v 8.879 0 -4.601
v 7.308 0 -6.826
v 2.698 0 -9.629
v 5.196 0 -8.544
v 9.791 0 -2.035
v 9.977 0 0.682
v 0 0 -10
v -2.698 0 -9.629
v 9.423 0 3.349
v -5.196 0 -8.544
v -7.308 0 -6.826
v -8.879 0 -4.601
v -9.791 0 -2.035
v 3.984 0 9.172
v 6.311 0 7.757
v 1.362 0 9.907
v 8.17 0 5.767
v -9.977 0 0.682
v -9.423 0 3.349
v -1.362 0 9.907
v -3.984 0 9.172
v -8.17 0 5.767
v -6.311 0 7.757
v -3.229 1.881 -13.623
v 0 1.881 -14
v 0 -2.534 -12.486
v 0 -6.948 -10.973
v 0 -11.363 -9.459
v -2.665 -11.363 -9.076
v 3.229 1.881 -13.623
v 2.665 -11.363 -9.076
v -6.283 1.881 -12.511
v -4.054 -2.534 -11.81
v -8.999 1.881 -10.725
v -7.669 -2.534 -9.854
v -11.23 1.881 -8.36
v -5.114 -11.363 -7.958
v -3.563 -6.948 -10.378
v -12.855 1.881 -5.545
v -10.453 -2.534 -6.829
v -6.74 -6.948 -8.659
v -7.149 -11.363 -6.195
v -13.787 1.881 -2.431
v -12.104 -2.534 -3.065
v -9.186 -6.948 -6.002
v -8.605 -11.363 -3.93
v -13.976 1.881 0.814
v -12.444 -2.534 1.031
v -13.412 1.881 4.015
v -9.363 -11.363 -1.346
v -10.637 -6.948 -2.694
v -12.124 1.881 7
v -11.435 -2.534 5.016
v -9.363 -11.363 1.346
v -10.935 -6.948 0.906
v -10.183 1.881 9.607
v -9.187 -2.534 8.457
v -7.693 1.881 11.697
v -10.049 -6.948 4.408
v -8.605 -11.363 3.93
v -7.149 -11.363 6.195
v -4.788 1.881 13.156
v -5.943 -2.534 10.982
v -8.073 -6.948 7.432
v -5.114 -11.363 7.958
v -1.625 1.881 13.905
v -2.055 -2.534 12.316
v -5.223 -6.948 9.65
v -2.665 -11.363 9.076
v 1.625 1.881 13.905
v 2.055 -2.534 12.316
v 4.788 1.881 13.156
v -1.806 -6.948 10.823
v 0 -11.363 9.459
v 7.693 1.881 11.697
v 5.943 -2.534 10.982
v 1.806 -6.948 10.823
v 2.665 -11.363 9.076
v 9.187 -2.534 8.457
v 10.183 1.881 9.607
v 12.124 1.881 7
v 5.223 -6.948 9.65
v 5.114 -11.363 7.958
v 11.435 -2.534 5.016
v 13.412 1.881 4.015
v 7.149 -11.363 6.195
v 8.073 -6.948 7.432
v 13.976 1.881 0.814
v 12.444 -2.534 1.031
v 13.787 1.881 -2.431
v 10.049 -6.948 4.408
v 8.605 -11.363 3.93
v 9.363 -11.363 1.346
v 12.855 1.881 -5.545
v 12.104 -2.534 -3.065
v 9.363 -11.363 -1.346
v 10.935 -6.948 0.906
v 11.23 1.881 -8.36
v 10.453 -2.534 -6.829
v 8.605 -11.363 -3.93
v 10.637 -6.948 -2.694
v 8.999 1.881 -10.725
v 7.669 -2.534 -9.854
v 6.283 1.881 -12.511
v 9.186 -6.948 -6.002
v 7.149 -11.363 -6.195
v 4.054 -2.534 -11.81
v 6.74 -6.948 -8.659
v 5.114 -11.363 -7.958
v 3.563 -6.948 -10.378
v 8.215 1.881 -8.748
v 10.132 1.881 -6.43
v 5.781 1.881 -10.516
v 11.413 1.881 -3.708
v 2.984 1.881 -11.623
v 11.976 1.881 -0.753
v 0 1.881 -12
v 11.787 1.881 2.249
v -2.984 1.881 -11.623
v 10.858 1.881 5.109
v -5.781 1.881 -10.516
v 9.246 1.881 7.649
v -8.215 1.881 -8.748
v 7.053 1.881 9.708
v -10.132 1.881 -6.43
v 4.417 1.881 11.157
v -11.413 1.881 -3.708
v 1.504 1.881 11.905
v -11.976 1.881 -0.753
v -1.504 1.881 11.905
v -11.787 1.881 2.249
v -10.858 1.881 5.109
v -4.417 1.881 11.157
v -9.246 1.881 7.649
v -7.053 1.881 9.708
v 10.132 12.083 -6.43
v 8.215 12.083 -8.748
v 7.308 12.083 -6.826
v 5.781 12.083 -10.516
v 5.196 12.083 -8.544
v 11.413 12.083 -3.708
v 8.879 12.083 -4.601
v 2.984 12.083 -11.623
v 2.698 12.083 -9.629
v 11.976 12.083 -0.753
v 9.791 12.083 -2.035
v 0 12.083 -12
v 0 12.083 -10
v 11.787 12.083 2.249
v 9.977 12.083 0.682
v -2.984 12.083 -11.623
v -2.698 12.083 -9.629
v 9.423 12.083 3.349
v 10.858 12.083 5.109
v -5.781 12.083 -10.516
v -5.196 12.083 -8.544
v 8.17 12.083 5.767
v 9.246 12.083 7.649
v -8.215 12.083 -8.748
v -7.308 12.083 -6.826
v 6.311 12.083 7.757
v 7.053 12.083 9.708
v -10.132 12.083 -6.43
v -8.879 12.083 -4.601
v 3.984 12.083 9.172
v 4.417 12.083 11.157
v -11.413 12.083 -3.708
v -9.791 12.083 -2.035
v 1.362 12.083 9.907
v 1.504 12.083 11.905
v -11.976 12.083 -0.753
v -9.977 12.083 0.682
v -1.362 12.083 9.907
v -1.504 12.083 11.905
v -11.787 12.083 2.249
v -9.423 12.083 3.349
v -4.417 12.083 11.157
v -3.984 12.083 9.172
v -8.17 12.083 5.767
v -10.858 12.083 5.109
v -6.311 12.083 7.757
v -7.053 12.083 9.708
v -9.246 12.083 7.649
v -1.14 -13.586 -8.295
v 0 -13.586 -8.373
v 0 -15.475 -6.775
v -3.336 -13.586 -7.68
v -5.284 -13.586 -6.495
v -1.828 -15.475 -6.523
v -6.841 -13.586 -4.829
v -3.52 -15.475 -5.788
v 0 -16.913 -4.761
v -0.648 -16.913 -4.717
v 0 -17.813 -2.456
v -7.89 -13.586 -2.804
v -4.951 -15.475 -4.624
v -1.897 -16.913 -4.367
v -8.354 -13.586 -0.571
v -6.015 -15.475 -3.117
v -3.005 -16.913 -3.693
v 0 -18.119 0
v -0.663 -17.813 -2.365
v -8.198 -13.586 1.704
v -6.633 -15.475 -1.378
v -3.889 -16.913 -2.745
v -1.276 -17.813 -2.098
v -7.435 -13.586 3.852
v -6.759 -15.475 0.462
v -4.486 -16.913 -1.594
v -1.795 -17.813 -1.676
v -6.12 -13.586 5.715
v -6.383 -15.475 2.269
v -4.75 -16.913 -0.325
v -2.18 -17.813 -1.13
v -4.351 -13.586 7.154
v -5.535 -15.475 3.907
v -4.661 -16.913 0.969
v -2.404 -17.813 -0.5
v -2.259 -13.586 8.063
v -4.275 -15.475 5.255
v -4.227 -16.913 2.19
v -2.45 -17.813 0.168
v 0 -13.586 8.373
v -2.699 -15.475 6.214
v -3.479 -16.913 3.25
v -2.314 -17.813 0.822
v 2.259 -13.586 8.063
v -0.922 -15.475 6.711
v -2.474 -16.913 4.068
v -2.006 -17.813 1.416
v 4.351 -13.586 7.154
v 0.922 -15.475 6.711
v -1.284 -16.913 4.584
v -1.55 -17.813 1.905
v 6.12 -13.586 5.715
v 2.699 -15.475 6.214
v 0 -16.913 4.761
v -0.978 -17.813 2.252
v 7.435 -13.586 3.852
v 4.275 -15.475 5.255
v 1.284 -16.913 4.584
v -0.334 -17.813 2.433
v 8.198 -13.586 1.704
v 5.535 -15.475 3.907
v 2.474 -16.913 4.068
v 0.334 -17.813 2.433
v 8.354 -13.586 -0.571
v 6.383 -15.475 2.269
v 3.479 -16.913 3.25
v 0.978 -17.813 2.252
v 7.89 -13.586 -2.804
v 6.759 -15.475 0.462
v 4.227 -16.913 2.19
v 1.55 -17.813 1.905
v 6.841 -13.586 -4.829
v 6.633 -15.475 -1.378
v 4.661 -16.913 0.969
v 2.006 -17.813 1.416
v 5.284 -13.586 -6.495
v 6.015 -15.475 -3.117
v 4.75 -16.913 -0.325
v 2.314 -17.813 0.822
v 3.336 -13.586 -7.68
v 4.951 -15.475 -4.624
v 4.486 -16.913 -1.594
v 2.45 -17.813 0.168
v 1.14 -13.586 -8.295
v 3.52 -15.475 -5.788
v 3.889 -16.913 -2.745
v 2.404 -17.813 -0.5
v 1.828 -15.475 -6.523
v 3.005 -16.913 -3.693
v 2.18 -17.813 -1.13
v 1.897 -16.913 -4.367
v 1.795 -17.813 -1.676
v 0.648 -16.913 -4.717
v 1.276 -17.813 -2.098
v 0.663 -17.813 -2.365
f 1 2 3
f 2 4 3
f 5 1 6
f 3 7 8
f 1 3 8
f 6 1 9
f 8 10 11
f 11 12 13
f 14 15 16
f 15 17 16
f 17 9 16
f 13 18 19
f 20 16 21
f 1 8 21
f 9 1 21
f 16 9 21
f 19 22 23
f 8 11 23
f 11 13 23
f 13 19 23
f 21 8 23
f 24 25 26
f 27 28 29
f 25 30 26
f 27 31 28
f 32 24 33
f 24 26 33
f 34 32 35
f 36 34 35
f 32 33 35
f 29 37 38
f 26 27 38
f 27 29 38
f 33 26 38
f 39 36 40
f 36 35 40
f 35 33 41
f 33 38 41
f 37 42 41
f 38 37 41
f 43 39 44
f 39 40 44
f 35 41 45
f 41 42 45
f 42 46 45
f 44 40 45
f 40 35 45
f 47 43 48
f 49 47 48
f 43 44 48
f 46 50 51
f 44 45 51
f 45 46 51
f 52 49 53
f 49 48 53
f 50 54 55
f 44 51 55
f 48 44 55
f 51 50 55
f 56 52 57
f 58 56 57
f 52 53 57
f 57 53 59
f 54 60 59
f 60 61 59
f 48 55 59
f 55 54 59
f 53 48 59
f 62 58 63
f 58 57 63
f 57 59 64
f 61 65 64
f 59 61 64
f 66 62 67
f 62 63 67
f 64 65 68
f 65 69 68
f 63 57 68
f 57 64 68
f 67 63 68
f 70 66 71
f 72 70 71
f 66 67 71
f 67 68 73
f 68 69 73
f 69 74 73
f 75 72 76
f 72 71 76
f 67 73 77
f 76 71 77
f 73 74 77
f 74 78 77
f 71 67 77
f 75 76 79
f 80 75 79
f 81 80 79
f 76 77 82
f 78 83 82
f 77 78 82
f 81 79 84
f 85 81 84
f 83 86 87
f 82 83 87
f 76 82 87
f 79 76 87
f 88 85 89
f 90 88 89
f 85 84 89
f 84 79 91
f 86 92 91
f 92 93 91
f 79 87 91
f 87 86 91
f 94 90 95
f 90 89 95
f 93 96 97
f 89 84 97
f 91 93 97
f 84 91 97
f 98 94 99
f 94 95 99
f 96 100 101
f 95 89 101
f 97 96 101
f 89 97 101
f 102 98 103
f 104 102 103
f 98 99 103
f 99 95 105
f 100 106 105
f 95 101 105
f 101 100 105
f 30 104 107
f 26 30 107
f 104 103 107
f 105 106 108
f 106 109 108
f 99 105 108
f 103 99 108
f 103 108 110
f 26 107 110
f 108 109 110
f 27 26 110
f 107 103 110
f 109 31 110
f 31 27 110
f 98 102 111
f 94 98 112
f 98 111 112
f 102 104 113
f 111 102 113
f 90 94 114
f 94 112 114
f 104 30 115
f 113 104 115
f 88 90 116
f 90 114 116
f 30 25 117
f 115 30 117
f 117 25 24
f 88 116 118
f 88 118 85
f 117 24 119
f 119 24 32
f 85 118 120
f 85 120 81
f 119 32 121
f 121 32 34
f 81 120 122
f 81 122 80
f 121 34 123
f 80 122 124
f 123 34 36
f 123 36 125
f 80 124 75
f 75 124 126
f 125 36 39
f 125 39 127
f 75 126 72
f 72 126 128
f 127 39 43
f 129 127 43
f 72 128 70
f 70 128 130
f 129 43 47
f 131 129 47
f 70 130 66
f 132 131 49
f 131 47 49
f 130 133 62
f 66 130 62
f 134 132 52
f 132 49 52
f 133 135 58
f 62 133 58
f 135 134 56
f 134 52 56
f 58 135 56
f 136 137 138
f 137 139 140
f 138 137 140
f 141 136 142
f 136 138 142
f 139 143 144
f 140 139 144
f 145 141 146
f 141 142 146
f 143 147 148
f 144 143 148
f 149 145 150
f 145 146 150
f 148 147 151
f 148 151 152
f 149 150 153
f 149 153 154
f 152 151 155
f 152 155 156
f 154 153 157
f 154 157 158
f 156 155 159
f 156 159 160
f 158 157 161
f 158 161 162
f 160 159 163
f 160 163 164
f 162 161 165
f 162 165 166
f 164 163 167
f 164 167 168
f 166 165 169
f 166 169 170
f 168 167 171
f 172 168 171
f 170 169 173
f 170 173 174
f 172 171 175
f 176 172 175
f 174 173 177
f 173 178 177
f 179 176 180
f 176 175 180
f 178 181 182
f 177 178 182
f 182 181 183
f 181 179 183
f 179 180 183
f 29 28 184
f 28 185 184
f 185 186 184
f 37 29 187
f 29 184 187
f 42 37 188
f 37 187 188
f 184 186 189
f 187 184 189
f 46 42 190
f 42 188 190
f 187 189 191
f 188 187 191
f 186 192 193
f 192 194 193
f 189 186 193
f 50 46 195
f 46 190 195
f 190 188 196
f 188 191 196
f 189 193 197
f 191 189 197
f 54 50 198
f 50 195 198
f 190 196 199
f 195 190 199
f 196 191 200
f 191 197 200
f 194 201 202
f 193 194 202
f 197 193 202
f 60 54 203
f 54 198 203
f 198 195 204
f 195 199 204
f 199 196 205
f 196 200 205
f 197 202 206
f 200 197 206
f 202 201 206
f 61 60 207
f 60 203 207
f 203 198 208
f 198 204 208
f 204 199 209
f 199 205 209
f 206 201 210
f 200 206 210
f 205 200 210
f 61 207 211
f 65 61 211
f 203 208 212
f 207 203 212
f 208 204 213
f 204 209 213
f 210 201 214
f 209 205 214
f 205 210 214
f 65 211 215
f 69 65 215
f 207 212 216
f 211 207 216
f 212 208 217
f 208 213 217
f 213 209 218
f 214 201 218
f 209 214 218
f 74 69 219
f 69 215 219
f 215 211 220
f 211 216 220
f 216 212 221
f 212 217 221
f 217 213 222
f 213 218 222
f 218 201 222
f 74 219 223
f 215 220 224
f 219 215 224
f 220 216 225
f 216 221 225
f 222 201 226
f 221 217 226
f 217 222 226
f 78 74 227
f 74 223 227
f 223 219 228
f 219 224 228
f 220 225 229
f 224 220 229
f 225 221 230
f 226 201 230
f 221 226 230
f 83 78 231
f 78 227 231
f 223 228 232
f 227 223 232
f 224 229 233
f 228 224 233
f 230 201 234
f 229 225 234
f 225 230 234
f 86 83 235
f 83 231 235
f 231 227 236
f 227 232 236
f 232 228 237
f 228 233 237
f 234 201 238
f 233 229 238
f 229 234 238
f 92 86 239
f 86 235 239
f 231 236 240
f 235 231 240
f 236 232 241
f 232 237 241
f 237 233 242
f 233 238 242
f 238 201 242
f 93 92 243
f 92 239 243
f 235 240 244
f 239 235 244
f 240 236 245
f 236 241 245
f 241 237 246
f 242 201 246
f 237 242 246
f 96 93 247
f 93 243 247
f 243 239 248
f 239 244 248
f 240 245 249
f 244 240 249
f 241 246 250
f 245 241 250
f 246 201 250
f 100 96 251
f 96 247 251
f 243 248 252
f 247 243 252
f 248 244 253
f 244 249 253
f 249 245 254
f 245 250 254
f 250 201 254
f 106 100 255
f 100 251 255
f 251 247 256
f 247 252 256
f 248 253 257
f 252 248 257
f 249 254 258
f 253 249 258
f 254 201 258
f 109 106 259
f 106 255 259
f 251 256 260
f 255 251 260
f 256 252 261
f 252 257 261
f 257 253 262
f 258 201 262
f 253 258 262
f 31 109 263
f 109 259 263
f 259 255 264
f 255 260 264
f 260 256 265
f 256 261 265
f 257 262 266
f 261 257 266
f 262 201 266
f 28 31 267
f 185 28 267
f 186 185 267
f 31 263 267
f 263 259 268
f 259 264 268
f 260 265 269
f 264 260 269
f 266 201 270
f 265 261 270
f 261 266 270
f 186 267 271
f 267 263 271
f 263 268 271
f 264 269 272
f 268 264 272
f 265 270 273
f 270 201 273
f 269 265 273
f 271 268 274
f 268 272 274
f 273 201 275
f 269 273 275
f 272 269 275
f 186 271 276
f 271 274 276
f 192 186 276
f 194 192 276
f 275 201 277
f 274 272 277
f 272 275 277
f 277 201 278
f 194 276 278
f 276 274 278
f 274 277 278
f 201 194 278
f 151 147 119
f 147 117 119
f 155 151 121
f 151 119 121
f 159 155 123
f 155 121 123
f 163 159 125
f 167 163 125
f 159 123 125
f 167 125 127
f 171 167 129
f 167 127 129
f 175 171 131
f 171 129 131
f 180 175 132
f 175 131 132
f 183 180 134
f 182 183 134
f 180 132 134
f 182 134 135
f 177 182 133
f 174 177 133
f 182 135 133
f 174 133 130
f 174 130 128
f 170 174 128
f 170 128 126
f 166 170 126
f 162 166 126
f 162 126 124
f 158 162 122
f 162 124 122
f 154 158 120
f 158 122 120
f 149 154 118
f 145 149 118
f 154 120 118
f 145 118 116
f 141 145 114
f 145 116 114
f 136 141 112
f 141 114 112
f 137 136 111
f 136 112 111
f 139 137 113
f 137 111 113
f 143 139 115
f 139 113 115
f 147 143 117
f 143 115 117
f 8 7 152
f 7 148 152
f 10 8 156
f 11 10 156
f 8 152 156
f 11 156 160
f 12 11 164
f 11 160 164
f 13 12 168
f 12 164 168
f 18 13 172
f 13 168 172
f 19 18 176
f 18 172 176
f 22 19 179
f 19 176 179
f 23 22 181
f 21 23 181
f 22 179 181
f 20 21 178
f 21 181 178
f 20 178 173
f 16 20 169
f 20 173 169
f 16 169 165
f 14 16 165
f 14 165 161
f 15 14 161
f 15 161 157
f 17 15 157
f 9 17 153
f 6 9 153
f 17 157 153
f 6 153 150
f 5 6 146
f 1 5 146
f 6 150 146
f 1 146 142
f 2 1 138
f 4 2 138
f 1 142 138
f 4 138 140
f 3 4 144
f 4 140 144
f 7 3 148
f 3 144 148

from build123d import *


with BuildPart() as part:
    # Esquisse1 → Révolution1 (revolve)
    with BuildSketch(Plane.XY, mode=Mode.PRIVATE) as r_volution1_sk:
        with BuildLine():
            Line((-10, 0), (-10, 12.083333333))
            Line((-10, 12.083333333), (-12, 12.083333333))
            Line((-12, 12.083333333), (-12, 1.880668734))
            Line((-12, 1.880668734), (-14, 1.880668734))
            Line((-14, 1.880668734), (-9.459459459, -11.362574509))
            ThreePointArc((-9.459459459, -11.362574509), (-5.812381937, -16.256665978), (0, -18.119331266))
            Line((0, -18.119331266), (0, 0))
            Line((0, 0), (-10, 0))
        make_face()
    revolve(r_volution1_sk.sketch.rotate(Axis((0, 0, 0), (0, 1, 0)), 270), axis=Axis((0, 0, 0), (0, 1, 0)))


solid = part.part
